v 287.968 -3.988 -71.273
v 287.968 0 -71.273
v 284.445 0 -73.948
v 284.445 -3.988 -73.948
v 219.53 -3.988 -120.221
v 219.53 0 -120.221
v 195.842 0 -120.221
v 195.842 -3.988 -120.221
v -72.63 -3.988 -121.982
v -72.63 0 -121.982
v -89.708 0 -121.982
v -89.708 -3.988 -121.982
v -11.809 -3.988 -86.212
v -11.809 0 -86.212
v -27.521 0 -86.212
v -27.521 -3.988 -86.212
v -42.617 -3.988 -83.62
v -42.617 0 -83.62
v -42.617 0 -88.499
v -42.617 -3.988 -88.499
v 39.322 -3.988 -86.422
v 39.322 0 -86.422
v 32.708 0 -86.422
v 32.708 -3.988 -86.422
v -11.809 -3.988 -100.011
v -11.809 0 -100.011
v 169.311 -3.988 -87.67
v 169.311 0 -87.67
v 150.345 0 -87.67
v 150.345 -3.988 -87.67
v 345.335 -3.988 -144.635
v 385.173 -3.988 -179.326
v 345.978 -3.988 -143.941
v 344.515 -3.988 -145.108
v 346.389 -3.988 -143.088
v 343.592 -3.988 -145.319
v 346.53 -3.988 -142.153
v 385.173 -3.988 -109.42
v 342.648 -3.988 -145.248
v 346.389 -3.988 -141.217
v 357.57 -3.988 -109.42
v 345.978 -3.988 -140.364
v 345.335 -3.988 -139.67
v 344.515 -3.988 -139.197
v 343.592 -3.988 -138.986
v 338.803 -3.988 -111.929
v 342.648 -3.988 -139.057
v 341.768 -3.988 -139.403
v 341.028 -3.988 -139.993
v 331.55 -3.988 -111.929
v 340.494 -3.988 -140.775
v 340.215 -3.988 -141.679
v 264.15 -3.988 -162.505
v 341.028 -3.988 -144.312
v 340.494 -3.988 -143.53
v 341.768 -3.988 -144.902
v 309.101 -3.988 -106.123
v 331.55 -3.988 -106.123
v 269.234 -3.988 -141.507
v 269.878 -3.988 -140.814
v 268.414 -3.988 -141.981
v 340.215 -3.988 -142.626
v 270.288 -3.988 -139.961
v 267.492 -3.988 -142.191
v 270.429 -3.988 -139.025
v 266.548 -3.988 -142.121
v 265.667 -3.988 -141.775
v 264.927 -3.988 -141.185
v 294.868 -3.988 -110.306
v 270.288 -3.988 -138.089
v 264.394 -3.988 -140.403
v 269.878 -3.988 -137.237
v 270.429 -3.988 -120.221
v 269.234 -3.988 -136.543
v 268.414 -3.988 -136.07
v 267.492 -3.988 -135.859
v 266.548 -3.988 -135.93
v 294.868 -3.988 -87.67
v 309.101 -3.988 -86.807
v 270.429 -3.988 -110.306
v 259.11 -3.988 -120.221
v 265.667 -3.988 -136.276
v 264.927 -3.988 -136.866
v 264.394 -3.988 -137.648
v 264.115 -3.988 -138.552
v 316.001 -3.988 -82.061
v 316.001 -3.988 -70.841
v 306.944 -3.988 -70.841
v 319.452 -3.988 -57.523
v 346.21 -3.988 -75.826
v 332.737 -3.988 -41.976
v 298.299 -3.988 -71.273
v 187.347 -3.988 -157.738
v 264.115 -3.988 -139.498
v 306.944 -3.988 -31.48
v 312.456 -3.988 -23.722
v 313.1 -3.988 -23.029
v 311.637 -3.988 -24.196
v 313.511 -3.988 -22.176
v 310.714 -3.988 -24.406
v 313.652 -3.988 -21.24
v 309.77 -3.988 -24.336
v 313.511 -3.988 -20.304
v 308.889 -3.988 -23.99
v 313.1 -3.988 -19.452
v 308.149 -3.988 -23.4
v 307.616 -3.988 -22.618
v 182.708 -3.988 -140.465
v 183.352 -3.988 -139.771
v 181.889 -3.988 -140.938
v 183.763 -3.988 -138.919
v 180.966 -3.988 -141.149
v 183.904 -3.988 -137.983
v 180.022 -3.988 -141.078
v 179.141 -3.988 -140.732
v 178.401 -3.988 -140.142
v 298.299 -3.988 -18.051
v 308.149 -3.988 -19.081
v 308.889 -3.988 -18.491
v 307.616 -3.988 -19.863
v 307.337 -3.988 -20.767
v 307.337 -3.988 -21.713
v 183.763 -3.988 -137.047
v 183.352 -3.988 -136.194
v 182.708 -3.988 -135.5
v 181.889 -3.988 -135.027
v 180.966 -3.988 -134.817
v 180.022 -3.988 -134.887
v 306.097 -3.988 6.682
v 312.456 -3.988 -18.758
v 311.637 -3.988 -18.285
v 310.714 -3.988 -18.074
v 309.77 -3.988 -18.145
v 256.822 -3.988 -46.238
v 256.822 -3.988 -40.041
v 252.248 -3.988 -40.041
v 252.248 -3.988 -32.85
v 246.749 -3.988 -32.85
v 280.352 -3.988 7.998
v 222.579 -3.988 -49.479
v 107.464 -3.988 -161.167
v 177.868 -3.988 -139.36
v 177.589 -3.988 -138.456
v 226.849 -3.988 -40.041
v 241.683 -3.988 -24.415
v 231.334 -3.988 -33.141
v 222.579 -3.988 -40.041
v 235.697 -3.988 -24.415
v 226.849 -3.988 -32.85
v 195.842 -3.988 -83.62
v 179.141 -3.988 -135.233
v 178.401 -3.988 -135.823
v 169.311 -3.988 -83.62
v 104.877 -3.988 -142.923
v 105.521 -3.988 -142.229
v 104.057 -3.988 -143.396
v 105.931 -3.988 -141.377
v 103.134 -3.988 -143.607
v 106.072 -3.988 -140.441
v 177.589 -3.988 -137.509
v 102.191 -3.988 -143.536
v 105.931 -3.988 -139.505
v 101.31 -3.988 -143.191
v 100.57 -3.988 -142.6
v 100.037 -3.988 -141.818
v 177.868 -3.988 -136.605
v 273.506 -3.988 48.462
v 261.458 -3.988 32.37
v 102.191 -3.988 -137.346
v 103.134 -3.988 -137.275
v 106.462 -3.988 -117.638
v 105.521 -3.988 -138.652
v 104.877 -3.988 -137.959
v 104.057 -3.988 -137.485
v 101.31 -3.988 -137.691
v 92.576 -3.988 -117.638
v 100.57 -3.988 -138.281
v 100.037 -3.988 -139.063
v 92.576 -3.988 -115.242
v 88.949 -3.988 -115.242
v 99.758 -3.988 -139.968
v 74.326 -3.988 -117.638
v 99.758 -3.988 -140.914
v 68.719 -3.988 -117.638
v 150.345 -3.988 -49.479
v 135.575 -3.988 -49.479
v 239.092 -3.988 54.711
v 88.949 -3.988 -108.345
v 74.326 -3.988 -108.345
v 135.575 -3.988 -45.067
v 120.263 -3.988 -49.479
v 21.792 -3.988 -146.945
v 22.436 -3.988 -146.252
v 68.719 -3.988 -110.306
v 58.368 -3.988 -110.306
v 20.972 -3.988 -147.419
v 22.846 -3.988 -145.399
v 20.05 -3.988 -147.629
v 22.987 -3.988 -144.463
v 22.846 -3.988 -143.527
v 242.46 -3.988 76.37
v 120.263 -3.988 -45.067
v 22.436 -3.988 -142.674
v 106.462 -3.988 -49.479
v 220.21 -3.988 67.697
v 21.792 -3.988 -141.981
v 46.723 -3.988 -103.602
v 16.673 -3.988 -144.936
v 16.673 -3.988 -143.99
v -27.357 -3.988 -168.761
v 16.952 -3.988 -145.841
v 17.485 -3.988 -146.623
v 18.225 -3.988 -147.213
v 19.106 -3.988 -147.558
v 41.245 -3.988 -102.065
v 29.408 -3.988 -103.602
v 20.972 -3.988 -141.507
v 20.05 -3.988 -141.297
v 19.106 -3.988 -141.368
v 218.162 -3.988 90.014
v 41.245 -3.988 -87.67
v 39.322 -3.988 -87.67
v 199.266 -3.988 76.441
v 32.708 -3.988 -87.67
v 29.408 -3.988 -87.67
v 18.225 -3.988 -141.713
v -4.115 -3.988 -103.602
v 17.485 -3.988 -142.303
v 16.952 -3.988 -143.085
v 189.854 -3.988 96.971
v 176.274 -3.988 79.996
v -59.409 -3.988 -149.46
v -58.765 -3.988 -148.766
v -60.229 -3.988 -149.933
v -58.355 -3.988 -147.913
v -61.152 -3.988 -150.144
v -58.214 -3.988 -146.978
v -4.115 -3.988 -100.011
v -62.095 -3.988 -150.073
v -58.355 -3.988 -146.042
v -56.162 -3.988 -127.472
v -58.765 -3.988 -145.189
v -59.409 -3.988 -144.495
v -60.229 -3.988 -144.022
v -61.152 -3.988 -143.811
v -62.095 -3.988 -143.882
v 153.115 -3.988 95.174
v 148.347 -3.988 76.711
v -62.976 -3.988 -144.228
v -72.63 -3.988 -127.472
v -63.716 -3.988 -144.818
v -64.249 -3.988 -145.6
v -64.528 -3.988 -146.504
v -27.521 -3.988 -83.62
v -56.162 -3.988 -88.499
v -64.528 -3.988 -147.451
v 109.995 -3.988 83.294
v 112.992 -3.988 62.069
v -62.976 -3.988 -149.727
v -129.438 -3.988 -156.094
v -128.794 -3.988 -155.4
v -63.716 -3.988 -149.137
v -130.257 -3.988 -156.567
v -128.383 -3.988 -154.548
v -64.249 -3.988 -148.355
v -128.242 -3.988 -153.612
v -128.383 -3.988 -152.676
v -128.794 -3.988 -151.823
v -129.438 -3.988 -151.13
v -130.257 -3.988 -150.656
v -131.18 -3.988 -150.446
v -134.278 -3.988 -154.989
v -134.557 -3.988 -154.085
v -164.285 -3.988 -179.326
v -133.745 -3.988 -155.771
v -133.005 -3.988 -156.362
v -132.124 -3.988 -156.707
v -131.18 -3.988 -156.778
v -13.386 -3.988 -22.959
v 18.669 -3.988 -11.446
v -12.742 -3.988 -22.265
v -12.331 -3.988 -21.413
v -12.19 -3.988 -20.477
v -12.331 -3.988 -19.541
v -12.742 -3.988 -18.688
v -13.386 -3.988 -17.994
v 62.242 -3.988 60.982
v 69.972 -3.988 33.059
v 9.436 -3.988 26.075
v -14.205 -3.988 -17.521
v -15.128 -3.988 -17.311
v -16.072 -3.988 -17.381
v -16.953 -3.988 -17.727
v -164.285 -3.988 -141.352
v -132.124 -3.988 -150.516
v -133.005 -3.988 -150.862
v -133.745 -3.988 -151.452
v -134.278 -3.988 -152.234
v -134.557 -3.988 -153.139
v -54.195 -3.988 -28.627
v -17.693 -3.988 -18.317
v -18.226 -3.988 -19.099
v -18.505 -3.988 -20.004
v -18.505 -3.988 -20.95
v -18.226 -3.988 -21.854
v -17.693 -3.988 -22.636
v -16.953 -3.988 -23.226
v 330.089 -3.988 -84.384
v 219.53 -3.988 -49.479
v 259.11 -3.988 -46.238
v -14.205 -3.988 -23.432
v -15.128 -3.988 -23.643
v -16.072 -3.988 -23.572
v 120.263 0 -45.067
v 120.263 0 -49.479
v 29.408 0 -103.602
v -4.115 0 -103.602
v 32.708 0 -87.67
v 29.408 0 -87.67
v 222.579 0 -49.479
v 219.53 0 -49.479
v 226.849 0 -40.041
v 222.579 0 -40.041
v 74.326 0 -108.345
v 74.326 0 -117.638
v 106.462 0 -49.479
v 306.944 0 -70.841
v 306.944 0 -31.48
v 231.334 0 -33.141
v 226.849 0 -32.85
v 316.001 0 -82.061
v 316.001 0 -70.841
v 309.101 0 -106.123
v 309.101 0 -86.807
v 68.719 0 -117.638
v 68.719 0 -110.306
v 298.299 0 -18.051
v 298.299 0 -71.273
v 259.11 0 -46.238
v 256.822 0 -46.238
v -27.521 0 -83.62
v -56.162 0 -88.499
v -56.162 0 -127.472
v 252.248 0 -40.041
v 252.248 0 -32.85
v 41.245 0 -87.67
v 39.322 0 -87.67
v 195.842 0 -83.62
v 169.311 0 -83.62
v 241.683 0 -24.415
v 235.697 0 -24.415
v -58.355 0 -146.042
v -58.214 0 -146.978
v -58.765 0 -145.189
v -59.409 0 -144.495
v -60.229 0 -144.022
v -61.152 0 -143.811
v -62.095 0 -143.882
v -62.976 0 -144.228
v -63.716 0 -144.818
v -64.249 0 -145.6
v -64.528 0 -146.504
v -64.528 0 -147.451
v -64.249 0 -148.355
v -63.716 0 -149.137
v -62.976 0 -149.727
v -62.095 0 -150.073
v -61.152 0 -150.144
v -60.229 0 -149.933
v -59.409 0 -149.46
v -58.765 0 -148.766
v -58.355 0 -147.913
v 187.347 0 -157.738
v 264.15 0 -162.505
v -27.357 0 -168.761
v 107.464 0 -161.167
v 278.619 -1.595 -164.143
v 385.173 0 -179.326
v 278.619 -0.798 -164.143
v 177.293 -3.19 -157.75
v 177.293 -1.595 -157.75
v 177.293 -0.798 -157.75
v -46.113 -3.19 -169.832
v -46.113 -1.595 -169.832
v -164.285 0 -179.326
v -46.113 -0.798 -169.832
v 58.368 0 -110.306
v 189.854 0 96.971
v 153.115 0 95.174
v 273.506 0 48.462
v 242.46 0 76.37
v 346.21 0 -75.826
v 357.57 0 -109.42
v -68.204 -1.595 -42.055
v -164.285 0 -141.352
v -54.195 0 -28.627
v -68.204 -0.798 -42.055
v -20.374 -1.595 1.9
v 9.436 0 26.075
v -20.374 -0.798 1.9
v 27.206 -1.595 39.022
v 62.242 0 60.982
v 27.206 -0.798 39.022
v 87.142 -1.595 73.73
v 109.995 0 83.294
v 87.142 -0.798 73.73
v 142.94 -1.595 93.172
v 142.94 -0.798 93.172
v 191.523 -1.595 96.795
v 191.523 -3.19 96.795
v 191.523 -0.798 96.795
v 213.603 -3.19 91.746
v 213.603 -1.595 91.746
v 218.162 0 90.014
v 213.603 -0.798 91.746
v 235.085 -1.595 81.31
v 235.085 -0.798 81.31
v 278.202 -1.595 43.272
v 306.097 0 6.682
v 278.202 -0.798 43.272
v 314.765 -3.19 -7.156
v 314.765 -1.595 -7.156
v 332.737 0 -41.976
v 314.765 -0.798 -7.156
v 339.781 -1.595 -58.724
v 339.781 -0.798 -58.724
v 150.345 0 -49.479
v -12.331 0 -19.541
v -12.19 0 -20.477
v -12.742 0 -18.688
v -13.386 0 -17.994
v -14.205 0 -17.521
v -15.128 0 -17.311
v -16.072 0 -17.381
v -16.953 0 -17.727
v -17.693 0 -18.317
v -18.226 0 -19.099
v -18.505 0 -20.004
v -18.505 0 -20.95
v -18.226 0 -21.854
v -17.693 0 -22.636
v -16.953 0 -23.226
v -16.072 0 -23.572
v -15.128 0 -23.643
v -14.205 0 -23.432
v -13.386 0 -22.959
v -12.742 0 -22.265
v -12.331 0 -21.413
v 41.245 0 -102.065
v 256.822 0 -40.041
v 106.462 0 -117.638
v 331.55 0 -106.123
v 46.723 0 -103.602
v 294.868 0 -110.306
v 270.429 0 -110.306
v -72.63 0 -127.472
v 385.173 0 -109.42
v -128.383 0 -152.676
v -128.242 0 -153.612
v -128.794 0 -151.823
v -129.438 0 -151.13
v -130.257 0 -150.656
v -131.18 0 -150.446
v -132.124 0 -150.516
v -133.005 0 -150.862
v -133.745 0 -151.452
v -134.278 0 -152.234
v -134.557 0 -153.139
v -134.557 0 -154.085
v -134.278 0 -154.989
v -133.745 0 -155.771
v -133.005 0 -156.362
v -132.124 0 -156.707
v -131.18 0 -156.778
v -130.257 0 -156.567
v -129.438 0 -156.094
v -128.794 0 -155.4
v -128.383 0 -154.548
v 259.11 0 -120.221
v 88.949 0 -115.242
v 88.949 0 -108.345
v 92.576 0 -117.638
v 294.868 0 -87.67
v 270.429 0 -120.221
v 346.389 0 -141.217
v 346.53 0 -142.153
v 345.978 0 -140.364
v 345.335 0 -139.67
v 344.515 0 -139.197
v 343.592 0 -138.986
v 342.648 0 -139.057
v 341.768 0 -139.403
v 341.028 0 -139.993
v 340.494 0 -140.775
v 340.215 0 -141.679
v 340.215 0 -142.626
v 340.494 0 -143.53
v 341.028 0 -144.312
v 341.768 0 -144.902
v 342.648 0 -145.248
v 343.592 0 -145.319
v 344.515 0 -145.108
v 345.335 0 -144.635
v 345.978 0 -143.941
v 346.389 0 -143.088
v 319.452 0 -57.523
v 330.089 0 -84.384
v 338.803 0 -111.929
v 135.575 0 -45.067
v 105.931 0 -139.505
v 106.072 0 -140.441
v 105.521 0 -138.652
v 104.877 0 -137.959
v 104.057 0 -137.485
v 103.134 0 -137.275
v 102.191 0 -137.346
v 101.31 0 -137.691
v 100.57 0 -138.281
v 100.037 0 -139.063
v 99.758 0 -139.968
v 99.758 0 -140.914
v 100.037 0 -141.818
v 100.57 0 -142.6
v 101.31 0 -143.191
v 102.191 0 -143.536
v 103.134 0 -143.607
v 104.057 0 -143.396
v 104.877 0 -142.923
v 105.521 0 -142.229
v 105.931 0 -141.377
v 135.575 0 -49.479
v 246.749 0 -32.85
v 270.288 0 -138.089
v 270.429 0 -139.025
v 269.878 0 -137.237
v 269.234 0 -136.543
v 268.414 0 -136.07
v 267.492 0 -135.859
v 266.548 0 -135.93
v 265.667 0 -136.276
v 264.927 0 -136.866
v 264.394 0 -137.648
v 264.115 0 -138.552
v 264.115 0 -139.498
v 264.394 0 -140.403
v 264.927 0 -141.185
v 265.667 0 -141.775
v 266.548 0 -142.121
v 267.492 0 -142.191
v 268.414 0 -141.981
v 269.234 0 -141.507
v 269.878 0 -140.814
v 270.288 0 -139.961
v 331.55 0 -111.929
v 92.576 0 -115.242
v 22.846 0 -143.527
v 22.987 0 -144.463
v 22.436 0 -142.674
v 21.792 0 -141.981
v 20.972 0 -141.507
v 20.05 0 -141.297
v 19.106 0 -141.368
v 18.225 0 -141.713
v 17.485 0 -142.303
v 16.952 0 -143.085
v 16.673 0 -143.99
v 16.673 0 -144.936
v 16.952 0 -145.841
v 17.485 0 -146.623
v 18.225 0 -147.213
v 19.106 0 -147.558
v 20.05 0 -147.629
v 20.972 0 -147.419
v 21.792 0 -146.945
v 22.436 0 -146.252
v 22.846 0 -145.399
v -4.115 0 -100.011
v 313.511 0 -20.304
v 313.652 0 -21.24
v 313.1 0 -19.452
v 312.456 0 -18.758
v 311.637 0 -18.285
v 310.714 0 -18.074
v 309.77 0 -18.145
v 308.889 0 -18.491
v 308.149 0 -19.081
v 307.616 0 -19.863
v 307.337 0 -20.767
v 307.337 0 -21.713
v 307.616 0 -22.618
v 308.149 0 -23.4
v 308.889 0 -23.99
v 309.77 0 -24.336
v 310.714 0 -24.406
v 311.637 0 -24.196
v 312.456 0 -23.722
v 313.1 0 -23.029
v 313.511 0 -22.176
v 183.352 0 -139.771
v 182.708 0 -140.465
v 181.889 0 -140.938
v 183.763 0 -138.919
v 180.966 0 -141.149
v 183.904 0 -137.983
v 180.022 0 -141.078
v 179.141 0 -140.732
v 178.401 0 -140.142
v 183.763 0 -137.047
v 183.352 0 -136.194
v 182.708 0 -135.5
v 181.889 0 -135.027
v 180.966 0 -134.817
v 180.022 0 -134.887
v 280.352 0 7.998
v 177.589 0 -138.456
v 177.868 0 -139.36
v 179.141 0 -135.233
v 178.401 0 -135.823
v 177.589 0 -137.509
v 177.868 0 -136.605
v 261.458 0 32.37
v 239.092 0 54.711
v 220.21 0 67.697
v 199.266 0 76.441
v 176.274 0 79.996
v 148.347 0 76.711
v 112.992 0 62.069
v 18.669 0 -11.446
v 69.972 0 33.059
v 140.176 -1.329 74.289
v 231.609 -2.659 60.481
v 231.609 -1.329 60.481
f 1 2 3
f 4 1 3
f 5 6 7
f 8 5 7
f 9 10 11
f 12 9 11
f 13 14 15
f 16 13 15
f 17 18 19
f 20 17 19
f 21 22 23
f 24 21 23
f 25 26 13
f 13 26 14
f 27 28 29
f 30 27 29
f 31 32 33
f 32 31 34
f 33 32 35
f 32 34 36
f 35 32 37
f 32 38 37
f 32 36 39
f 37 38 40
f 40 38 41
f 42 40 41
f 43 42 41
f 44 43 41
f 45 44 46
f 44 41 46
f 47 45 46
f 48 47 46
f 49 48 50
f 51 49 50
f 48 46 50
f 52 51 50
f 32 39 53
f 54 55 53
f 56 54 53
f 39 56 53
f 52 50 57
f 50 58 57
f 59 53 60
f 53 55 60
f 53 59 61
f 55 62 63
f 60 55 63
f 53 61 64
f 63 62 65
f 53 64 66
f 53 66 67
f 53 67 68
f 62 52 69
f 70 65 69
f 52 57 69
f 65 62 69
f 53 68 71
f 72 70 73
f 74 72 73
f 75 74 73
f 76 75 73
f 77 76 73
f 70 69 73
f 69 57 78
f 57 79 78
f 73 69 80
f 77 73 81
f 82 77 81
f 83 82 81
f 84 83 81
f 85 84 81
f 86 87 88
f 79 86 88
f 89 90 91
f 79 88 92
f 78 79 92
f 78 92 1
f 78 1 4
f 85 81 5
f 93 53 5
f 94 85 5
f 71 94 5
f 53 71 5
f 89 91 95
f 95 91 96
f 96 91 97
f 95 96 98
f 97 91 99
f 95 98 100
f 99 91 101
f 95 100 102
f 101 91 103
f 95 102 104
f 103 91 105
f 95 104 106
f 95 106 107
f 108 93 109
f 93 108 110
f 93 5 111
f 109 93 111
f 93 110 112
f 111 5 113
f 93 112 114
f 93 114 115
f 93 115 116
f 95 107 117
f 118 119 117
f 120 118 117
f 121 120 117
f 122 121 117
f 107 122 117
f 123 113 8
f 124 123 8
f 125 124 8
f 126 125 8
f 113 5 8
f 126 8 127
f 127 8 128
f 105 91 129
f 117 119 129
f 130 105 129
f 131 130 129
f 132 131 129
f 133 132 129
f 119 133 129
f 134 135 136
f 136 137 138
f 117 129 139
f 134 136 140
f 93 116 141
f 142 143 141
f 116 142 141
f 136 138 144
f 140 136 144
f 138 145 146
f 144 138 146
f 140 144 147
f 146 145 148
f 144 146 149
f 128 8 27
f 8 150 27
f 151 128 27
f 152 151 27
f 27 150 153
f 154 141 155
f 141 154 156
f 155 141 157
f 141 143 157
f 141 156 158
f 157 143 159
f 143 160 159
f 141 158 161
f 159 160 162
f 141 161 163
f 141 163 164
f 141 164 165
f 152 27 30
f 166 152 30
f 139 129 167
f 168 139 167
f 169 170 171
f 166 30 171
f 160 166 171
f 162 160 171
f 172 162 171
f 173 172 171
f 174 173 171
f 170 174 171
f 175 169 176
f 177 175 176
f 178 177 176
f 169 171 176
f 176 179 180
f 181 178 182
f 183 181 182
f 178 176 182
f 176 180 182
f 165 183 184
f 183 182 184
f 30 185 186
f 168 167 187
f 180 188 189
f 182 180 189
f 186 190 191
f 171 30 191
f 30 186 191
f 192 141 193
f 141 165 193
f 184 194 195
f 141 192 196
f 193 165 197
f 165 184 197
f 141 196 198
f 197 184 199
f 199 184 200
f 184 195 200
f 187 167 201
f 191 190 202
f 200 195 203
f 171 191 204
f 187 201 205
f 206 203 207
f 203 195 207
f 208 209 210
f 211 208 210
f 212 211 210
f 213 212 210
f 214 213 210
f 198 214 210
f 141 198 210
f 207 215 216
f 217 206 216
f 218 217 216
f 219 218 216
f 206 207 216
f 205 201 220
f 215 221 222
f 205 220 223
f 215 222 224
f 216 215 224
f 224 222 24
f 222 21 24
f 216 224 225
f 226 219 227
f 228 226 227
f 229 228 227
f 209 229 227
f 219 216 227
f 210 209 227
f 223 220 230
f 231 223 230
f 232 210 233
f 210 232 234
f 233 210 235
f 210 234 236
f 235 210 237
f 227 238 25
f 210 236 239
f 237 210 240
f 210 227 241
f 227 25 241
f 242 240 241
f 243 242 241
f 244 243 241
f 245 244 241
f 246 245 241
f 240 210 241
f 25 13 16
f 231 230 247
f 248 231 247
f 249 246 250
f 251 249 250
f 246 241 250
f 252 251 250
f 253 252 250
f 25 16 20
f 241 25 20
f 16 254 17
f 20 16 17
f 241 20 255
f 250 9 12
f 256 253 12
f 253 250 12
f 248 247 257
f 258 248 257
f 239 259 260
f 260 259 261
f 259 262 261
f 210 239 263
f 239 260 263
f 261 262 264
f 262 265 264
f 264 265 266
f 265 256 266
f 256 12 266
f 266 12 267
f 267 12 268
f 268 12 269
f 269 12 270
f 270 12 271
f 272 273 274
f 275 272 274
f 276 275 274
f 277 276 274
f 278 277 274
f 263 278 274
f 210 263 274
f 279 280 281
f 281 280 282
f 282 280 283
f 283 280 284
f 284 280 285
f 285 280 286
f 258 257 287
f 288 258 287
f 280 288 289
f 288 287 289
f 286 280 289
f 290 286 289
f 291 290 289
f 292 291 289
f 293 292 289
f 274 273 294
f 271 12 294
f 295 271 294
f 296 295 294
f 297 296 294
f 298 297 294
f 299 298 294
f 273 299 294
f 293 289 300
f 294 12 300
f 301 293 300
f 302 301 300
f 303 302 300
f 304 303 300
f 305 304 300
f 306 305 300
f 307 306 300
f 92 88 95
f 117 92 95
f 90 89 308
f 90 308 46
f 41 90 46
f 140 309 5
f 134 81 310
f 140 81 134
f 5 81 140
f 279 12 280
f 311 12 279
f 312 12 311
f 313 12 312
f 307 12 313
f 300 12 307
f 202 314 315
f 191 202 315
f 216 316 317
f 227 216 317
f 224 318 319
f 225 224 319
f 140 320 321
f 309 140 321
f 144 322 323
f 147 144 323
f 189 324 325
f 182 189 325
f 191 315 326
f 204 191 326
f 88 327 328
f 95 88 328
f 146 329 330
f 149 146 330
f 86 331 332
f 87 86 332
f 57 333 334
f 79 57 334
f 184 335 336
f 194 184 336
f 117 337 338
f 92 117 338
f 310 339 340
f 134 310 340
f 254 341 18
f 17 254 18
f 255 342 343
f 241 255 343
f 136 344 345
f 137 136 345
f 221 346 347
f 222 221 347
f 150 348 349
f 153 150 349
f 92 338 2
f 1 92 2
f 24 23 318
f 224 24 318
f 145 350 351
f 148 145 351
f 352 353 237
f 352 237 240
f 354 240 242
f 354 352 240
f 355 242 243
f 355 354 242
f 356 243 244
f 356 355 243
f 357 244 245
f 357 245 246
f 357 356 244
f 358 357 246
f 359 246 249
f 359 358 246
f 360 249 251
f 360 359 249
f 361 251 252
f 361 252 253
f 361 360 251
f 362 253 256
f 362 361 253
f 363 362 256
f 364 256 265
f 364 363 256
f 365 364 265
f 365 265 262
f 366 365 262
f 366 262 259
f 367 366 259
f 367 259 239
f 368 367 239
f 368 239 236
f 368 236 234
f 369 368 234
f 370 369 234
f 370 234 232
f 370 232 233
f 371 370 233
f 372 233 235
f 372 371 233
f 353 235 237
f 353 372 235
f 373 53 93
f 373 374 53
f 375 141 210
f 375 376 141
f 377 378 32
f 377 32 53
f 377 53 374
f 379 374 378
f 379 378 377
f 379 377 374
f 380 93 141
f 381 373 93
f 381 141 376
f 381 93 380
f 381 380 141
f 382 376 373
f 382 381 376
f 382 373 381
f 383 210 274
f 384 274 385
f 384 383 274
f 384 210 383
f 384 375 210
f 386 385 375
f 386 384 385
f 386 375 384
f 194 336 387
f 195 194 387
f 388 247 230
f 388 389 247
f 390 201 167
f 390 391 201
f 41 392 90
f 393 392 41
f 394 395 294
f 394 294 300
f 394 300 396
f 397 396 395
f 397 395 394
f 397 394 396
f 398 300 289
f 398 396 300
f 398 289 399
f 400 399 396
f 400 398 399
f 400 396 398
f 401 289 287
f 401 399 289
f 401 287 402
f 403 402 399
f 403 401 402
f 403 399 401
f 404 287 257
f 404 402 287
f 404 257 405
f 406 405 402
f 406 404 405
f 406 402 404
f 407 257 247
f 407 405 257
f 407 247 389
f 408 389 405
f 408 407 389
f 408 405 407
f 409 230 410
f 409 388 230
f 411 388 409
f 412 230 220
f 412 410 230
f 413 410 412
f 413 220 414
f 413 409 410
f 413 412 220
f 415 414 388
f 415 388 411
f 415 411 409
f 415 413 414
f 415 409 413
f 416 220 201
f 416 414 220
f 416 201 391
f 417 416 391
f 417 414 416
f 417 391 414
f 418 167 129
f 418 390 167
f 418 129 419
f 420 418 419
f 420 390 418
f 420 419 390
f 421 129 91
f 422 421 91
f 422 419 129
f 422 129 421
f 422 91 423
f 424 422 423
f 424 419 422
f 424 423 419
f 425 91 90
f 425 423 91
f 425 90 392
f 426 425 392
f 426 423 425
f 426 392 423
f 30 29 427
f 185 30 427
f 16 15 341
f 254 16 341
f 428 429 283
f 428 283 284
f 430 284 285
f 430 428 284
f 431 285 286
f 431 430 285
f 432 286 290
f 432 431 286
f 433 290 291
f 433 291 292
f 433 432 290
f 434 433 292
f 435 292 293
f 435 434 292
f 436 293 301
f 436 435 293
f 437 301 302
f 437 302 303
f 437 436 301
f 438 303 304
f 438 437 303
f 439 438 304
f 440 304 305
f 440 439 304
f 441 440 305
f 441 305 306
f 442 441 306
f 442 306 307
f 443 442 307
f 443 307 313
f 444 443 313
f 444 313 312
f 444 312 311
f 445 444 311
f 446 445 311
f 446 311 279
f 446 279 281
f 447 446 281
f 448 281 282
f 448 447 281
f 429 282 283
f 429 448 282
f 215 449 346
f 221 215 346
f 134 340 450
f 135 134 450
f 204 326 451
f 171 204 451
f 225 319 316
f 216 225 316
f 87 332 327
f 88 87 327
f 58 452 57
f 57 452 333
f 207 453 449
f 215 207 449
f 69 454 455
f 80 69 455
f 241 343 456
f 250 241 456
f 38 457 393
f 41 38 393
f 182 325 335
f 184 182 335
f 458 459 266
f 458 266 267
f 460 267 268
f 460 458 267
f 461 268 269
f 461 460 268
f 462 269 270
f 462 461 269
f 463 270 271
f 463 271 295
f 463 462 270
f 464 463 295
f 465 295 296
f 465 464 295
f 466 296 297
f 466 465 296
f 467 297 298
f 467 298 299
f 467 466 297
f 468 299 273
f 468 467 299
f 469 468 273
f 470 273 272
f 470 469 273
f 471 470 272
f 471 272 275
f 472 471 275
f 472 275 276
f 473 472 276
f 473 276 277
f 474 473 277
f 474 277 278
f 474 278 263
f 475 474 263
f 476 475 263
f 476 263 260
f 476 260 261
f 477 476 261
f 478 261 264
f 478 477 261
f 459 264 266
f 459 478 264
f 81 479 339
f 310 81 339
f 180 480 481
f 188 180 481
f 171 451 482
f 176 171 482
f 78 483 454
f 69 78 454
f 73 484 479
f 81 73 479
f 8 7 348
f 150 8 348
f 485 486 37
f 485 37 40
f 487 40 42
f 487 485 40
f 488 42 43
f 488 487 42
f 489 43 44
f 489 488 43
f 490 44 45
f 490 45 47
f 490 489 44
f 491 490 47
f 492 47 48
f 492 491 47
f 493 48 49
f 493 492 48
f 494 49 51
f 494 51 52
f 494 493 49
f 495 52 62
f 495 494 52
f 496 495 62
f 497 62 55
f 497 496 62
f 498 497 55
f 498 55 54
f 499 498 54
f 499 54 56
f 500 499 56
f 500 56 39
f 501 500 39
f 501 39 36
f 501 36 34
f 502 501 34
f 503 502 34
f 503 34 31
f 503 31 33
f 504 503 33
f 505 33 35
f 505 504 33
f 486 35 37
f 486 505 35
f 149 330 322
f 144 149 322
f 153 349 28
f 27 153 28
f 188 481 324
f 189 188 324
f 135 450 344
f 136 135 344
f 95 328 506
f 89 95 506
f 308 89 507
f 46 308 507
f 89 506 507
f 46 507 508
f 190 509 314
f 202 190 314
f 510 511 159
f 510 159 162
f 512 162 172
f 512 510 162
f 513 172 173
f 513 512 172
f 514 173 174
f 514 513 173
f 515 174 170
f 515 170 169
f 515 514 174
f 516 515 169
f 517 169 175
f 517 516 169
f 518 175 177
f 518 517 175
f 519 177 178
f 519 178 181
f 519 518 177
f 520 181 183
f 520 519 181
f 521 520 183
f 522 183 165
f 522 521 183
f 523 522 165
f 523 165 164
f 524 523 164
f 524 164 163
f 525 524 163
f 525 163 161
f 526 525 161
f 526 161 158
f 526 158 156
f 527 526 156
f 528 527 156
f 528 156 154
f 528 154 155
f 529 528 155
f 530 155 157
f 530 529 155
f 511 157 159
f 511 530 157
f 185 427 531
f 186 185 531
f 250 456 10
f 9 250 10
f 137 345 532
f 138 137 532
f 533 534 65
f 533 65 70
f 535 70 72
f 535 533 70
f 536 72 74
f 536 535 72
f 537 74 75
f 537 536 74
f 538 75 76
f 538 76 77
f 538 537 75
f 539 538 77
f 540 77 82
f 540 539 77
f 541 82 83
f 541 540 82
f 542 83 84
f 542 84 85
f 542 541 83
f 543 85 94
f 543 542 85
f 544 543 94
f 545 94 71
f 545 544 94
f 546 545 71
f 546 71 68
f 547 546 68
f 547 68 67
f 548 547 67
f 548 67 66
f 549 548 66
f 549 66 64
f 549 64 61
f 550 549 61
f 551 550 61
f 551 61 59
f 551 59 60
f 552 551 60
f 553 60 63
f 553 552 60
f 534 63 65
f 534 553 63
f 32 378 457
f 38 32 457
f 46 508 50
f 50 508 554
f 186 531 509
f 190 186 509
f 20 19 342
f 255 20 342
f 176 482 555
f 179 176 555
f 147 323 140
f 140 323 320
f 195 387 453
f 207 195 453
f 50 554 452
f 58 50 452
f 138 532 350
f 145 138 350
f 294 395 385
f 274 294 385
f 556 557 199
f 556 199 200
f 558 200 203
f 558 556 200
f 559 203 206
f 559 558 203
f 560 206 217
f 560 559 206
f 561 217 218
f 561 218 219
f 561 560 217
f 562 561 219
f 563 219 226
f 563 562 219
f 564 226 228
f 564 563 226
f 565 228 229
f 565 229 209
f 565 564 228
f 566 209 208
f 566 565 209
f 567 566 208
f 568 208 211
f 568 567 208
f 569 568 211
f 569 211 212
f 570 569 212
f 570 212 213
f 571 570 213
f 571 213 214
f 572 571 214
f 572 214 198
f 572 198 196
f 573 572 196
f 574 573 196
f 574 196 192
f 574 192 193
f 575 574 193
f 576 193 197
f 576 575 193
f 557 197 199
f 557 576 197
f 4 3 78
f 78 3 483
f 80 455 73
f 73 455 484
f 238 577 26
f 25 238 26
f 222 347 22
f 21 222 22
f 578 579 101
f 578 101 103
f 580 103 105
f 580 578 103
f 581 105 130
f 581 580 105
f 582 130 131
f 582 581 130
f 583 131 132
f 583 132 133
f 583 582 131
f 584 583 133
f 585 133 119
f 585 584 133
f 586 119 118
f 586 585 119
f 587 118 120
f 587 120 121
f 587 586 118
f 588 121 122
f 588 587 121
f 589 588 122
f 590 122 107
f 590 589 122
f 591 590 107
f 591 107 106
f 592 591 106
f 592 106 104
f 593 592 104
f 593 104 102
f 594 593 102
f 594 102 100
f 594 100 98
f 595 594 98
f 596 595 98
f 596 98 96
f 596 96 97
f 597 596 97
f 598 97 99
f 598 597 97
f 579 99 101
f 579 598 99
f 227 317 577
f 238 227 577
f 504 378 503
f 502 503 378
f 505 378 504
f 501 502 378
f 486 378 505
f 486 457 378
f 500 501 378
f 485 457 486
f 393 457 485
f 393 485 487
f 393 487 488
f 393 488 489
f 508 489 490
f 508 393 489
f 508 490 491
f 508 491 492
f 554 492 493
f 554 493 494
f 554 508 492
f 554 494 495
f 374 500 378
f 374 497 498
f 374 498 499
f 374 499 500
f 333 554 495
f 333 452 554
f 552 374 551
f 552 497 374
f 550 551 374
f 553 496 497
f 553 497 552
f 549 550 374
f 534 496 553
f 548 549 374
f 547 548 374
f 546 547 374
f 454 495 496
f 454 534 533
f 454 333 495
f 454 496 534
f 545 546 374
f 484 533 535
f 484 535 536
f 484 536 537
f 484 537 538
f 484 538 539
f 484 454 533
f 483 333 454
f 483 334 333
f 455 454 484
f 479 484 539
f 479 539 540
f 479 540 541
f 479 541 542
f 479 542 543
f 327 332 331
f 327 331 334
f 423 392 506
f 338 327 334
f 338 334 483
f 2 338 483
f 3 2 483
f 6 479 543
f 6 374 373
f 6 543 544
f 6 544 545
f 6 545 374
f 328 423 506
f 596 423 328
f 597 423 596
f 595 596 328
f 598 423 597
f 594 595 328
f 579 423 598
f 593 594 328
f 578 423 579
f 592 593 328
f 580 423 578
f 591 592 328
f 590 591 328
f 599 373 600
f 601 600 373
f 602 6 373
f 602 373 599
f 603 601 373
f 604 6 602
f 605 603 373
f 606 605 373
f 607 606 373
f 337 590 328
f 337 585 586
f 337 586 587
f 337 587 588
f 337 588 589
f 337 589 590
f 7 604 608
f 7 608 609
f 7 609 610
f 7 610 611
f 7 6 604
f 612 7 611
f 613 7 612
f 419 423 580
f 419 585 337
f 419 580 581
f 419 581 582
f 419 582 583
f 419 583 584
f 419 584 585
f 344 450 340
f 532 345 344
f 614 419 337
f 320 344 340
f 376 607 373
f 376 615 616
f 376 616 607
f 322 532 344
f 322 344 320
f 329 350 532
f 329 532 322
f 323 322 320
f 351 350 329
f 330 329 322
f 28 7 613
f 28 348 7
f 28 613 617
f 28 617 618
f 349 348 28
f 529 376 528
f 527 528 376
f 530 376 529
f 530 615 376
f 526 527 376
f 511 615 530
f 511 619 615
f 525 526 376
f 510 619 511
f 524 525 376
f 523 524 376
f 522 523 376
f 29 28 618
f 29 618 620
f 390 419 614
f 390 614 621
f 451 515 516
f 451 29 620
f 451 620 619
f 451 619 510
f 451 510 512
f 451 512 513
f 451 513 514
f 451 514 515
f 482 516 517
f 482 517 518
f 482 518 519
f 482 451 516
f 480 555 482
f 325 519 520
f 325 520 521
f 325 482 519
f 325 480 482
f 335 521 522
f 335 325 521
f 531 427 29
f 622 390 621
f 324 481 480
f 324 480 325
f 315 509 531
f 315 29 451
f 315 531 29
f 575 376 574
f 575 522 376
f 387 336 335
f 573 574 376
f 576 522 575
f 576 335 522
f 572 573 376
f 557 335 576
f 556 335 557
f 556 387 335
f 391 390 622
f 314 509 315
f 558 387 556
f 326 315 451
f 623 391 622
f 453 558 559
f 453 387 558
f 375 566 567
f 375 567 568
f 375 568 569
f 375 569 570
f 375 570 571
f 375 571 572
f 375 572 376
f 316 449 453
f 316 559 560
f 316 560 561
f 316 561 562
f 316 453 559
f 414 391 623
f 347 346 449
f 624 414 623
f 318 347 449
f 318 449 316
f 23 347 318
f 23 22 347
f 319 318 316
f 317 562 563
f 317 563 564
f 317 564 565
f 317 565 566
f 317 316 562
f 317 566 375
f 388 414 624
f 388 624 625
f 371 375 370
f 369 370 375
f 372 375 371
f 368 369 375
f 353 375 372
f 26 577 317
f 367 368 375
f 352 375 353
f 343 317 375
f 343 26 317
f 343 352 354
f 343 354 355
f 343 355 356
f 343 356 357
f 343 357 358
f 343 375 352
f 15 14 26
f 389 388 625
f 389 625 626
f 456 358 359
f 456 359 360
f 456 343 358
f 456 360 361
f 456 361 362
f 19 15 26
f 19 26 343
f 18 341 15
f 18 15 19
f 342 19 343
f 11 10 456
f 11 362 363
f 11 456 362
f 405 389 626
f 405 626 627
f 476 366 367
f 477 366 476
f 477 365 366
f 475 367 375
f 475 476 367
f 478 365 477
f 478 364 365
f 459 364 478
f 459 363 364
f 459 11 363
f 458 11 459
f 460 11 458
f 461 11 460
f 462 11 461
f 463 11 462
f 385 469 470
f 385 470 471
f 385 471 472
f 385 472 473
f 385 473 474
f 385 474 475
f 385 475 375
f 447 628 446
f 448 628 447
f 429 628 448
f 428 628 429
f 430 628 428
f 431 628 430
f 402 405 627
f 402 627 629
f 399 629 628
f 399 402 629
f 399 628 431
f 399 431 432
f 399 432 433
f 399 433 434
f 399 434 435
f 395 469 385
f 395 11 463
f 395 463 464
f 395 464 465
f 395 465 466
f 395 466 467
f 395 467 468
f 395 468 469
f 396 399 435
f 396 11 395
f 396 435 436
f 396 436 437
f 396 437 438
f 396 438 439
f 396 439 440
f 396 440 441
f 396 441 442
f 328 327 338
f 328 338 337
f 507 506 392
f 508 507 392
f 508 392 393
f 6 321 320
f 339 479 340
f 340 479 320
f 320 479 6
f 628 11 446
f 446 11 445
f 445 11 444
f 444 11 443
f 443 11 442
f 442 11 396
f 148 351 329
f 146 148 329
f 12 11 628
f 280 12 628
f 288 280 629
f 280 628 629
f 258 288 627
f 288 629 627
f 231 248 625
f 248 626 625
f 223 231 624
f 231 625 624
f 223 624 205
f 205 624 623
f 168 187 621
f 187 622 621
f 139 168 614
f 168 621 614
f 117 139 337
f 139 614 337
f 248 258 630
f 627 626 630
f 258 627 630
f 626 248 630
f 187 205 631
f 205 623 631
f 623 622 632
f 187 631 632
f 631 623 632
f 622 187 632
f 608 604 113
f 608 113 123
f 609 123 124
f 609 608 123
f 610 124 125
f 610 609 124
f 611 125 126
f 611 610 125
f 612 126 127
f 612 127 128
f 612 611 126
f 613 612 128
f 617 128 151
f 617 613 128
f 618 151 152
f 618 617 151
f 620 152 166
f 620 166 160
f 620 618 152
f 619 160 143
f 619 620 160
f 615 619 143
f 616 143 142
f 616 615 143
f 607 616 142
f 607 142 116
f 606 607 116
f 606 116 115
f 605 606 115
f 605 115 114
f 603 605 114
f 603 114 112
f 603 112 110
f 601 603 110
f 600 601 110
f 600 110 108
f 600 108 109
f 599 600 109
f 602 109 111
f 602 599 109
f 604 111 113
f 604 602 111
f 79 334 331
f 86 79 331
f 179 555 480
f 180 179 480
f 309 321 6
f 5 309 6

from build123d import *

# Parameters (mm, degrees)
F0_R     = 3.175
F1_DEPTH = 3.9878


with BuildPart() as f1:
    # F0 (on Front) → F1 (new body)
    with BuildSketch(Plane.XZ):
        with BuildLine():
            add(Edge.make_bspline(
                [(-164.2852276564, -141.3521319628), (-100.156843355, -73.1295208329), (11.2441296329, 45.3837606483), (154.0542989198, 104.7680480893), (241.1470776874, 91.9701309431), (324.8102257045, -9.5696449042), (346.9241198254, -76.9707890806), (357.5704693794, -109.4198971987)],
                knots=[0, 0, 0, 0, 0.2775234013, 0.4821012921, 0.6333720642, 0.8234933595, 1, 1, 1, 1], degree=3))
            Line((-164.2852276564, -141.3521319628), (-164.2852276564, -179.3255954981))
            add(Edge.make_bspline(
                [(385.1727545261, -179.3255954981), (348.0727643508, -173.6176506001), (275.9644217328, -162.5235655503), (177.1940206759, -154.8456122093), (68.7205096932, -164.9760811802), (-46.4274313326, -168.7339018432), (-124.8425084257, -175.7809407358), (-164.2852276564, -179.3255954981)],
                knots=[0, 0, 0, 0, 0.2004216256, 0.3895438025, 0.5875488784, 0.7925374253, 1, 1, 1, 1], degree=3))
            Line((385.1727545261, -179.3255954981), (385.1727545261, -139.626070857))
            Line((385.1727545261, -139.626070857), (385.1727545261, -109.4198971987))
            Line((385.1727545261, -109.4198971987), (357.5704693794, -109.4198971987))
        make_face()
        with Locations((-131.4172595739, -153.6118835211)):
            Circle(F0_R, mode=Mode.SUBTRACT)
        with Locations((-61.3888055086, -146.9776183367)):
            Circle(F0_R, mode=Mode.SUBTRACT)
        with Locations((19.8123361915, -144.4630026817)):
            Circle(F0_R, mode=Mode.SUBTRACT)
        with Locations((102.8972044587, -140.4408961535)):
            Circle(F0_R, mode=Mode.SUBTRACT)
        with Locations((180.7287931442, -137.9826813936)):
            Circle(F0_R, mode=Mode.SUBTRACT)
        with Locations((267.2542631626, -139.0251666307)):
            Circle(F0_R, mode=Mode.SUBTRACT)
        with Locations((343.3550000191, -142.1525925398)):
            Circle(F0_R, mode=Mode.SUBTRACT)
        with BuildLine():
            Line((306.9441020489, -70.8412900567), (306.9441020489, -31.4796595851))
            ThreePointArc((306.9441020489, -31.4796595851), (325.007737738, -70.8590701113), (338.8031721115, -111.9287535548))
            Line((338.8031721115, -111.9287535548), (331.5498530865, -111.9287535548))
            Line((331.5498530865, -111.9287535548), (331.5498530865, -106.1229780316))
            Line((331.5498530865, -106.1229780316), (309.1005086899, -106.1229780316))
            Line((309.1005086899, -106.1229780316), (309.1005086899, -86.8073999882))
            Line((309.1005086899, -86.8073999882), (316.0010874271, -82.0607170463))
            Line((316.0010874271, -82.0607170463), (316.0010874271, -70.8412900567))
            Line((316.0010874271, -70.8412900567), (306.9441020489, -70.8412900567))
        make_face(mode=Mode.SUBTRACT)
        with Locations((-15.3653593734, -20.4767584801)):
            Circle(F0_R, mode=Mode.SUBTRACT)
        with BuildLine():
            Line((-72.6297050714, -121.9821423292), (-89.7077471018, -121.9821423292))
            add(Edge.make_bspline(
                [(-89.7077471018, -121.9821423292), (-7.2301581396, -34.7309562714), (120.865310975, 100.7783590411), (238.8719165352, 69.902159723), (278.1365065251, 11.790489141), (298.2993423939, -18.0505476892)],
                knots=[0, 0, 0, 0, 0.4679649263, 0.7267936359, 1, 1, 1, 1], degree=3))
            Line((298.2993423939, -18.0505476892), (298.2993423939, -71.2728053331))
            Line((298.2993423939, -71.2728053331), (287.9675328732, -71.2728053331))
            Line((287.9675328732, -71.2728053331), (284.4450016498, -73.9484917618))
            Line((284.4450016498, -73.9484917618), (294.8680818081, -87.6704379916))
            Line((294.8680818081, -87.6704379916), (294.8680818081, -110.3058606386))
            Line((294.8680818081, -110.3058606386), (270.4292631626, -110.3058606386))
            Line((270.4292631626, -110.3058606386), (270.4292631626, -120.2213019133))
            Line((270.4292631626, -120.2213019133), (259.1095864773, -120.2213019133))
            Line((259.1095864773, -120.2213019133), (259.1095864773, -46.2383925915))
            Line((259.1095864773, -46.2383925915), (256.822347641, -46.2383925915))
            Line((256.822347641, -46.2383925915), (256.822347641, -40.0408916175))
            Line((256.822347641, -40.0408916175), (252.2478699684, -40.0408916175))
            Line((252.2478699684, -40.0408916175), (252.2478699684, -32.8498110175))
            Line((252.2478699684, -32.8498110175), (246.7488795519, -32.8498110175))
            Line((246.7488795519, -32.8498110175), (241.6834142365, -24.4151409715))
            Line((241.6834142365, -24.4151409715), (235.696554184, -24.4151409715))
            Line((235.696554184, -24.4151409715), (231.3337922096, -33.1406630576))
            Line((231.3337922096, -33.1406630576), (226.8488258123, -32.8498110175))
            Line((226.8488258123, -32.8498110175), (226.8488258123, -40.0408916175))
            Line((226.8488258123, -40.0408916175), (222.5793153048, -40.0408916175))
            Line((222.5793153048, -40.0408916175), (222.5793153048, -44.9229478836))
            Line((222.5793153048, -44.9229478836), (222.5793153048, -49.47938025))
            Line((222.5793153048, -49.47938025), (219.5296734571, -49.47938025))
            Line((219.5296734571, -49.47938025), (219.5296734571, -120.2213019133))
            Line((219.5296734571, -120.2213019133), (195.8424896002, -120.2213019133))
            Line((195.8424896002, -120.2213019133), (195.8424896002, -83.6197063327))
            Line((195.8424896002, -83.6197063327), (169.3105399609, -83.6197063327))
            Line((169.3105399609, -83.6197063327), (169.3105399609, -87.6704379916))
            Line((169.3105399609, -87.6704379916), (150.3449231386, -87.6704379916))
            Line((150.3449231386, -87.6704379916), (150.3449231386, -49.47938025))
            Line((150.3449231386, -49.47938025), (135.5753540993, -49.47938025))
            Line((135.5753540993, -49.47938025), (135.5753540993, -45.0673885643))
            Line((135.5753540993, -45.0673885643), (120.2631816268, -45.0673885643))
            Line((120.2631816268, -45.0673885643), (120.2631816268, -49.47938025))
            Line((120.2631816268, -49.47938025), (106.4620390534, -49.47938025))
            Line((106.4620390534, -49.47938025), (106.4620390534, -117.6377162337))
            Line((106.4620390534, -117.6377162337), (92.5758108497, -117.6377162337))
            Line((92.5758108497, -117.6377162337), (92.5758108497, -115.242421627))
            Line((92.5758108497, -115.242421627), (88.9491438866, -115.242421627))
            Line((88.9491438866, -115.242421627), (88.9491438866, -108.3453819156))
            Line((88.9491438866, -108.3453819156), (74.3256956339, -108.3453819156))
            Line((74.3256956339, -108.3453819156), (74.3256956339, -117.6377162337))
            Line((74.3256956339, -117.6377162337), (68.7189847231, -117.6377162337))
            Line((68.7189847231, -117.6377162337), (68.7189847231, -110.3058606386))
            Line((68.7189847231, -110.3058606386), (58.3681166172, -110.3058606386))
            Line((58.3681166172, -110.3058606386), (46.7234104872, -103.6015823483))
            Line((46.7234104872, -103.6015823483), (41.2449203432, -102.0648106933))
            Line((41.2449203432, -102.0648106933), (41.2449203432, -87.6704379916))
            Line((41.2449203432, -87.6704379916), (39.3215864897, -87.6704379916))
            Line((39.3215864897, -87.6704379916), (39.3215864897, -86.4217281342))
            Line((39.3215864897, -86.4217281342), (32.7077694237, -86.4217281342))
            Line((32.7077694237, -86.4217281342), (32.7077694237, -87.6704379916))
            Line((32.7077694237, -87.6704379916), (29.408339411, -87.6704379916))
            Line((29.408339411, -87.6704379916), (29.408339411, -103.6015823483))
            Line((29.408339411, -103.6015823483), (25.6323218346, -103.6015823483))
            Line((25.6323218346, -103.6015823483), (-4.1151833721, -103.6015823483))
            Line((-4.1151833721, -103.6015823483), (-4.1151833721, -100.0113710761))
            Line((-4.1151833721, -100.0113710761), (-11.8085052818, -100.0113710761))
            Line((-11.8085052818, -100.0113710761), (-11.8085052818, -86.211912334))
            Line((-11.8085052818, -86.211912334), (-27.5210384279, -86.211912334))
            Line((-27.5210384279, -86.211912334), (-27.5210384279, -83.6197063327))
            Line((-27.5210384279, -83.6197063327), (-42.6168069243, -83.6197063327))
            Line((-42.6168069243, -83.6197063327), (-42.6168069243, -88.4991511703))
            Line((-42.6168069243, -88.4991511703), (-56.1615861952, -88.4991511703))
            Line((-56.1615861952, -88.4991511703), (-56.1615861952, -127.4715065956))
            Line((-56.1615861952, -127.4715065956), (-72.6297050714, -127.4715065956))
            Line((-72.6297050714, -127.4715065956), (-72.6297050714, -121.9821423292))
        make_face(mode=Mode.SUBTRACT)
        with Locations((310.4767799377, -21.2401409715)):
            Circle(F0_R, mode=Mode.SUBTRACT)
    extrude(amount=F1_DEPTH)


solid = f1.part
